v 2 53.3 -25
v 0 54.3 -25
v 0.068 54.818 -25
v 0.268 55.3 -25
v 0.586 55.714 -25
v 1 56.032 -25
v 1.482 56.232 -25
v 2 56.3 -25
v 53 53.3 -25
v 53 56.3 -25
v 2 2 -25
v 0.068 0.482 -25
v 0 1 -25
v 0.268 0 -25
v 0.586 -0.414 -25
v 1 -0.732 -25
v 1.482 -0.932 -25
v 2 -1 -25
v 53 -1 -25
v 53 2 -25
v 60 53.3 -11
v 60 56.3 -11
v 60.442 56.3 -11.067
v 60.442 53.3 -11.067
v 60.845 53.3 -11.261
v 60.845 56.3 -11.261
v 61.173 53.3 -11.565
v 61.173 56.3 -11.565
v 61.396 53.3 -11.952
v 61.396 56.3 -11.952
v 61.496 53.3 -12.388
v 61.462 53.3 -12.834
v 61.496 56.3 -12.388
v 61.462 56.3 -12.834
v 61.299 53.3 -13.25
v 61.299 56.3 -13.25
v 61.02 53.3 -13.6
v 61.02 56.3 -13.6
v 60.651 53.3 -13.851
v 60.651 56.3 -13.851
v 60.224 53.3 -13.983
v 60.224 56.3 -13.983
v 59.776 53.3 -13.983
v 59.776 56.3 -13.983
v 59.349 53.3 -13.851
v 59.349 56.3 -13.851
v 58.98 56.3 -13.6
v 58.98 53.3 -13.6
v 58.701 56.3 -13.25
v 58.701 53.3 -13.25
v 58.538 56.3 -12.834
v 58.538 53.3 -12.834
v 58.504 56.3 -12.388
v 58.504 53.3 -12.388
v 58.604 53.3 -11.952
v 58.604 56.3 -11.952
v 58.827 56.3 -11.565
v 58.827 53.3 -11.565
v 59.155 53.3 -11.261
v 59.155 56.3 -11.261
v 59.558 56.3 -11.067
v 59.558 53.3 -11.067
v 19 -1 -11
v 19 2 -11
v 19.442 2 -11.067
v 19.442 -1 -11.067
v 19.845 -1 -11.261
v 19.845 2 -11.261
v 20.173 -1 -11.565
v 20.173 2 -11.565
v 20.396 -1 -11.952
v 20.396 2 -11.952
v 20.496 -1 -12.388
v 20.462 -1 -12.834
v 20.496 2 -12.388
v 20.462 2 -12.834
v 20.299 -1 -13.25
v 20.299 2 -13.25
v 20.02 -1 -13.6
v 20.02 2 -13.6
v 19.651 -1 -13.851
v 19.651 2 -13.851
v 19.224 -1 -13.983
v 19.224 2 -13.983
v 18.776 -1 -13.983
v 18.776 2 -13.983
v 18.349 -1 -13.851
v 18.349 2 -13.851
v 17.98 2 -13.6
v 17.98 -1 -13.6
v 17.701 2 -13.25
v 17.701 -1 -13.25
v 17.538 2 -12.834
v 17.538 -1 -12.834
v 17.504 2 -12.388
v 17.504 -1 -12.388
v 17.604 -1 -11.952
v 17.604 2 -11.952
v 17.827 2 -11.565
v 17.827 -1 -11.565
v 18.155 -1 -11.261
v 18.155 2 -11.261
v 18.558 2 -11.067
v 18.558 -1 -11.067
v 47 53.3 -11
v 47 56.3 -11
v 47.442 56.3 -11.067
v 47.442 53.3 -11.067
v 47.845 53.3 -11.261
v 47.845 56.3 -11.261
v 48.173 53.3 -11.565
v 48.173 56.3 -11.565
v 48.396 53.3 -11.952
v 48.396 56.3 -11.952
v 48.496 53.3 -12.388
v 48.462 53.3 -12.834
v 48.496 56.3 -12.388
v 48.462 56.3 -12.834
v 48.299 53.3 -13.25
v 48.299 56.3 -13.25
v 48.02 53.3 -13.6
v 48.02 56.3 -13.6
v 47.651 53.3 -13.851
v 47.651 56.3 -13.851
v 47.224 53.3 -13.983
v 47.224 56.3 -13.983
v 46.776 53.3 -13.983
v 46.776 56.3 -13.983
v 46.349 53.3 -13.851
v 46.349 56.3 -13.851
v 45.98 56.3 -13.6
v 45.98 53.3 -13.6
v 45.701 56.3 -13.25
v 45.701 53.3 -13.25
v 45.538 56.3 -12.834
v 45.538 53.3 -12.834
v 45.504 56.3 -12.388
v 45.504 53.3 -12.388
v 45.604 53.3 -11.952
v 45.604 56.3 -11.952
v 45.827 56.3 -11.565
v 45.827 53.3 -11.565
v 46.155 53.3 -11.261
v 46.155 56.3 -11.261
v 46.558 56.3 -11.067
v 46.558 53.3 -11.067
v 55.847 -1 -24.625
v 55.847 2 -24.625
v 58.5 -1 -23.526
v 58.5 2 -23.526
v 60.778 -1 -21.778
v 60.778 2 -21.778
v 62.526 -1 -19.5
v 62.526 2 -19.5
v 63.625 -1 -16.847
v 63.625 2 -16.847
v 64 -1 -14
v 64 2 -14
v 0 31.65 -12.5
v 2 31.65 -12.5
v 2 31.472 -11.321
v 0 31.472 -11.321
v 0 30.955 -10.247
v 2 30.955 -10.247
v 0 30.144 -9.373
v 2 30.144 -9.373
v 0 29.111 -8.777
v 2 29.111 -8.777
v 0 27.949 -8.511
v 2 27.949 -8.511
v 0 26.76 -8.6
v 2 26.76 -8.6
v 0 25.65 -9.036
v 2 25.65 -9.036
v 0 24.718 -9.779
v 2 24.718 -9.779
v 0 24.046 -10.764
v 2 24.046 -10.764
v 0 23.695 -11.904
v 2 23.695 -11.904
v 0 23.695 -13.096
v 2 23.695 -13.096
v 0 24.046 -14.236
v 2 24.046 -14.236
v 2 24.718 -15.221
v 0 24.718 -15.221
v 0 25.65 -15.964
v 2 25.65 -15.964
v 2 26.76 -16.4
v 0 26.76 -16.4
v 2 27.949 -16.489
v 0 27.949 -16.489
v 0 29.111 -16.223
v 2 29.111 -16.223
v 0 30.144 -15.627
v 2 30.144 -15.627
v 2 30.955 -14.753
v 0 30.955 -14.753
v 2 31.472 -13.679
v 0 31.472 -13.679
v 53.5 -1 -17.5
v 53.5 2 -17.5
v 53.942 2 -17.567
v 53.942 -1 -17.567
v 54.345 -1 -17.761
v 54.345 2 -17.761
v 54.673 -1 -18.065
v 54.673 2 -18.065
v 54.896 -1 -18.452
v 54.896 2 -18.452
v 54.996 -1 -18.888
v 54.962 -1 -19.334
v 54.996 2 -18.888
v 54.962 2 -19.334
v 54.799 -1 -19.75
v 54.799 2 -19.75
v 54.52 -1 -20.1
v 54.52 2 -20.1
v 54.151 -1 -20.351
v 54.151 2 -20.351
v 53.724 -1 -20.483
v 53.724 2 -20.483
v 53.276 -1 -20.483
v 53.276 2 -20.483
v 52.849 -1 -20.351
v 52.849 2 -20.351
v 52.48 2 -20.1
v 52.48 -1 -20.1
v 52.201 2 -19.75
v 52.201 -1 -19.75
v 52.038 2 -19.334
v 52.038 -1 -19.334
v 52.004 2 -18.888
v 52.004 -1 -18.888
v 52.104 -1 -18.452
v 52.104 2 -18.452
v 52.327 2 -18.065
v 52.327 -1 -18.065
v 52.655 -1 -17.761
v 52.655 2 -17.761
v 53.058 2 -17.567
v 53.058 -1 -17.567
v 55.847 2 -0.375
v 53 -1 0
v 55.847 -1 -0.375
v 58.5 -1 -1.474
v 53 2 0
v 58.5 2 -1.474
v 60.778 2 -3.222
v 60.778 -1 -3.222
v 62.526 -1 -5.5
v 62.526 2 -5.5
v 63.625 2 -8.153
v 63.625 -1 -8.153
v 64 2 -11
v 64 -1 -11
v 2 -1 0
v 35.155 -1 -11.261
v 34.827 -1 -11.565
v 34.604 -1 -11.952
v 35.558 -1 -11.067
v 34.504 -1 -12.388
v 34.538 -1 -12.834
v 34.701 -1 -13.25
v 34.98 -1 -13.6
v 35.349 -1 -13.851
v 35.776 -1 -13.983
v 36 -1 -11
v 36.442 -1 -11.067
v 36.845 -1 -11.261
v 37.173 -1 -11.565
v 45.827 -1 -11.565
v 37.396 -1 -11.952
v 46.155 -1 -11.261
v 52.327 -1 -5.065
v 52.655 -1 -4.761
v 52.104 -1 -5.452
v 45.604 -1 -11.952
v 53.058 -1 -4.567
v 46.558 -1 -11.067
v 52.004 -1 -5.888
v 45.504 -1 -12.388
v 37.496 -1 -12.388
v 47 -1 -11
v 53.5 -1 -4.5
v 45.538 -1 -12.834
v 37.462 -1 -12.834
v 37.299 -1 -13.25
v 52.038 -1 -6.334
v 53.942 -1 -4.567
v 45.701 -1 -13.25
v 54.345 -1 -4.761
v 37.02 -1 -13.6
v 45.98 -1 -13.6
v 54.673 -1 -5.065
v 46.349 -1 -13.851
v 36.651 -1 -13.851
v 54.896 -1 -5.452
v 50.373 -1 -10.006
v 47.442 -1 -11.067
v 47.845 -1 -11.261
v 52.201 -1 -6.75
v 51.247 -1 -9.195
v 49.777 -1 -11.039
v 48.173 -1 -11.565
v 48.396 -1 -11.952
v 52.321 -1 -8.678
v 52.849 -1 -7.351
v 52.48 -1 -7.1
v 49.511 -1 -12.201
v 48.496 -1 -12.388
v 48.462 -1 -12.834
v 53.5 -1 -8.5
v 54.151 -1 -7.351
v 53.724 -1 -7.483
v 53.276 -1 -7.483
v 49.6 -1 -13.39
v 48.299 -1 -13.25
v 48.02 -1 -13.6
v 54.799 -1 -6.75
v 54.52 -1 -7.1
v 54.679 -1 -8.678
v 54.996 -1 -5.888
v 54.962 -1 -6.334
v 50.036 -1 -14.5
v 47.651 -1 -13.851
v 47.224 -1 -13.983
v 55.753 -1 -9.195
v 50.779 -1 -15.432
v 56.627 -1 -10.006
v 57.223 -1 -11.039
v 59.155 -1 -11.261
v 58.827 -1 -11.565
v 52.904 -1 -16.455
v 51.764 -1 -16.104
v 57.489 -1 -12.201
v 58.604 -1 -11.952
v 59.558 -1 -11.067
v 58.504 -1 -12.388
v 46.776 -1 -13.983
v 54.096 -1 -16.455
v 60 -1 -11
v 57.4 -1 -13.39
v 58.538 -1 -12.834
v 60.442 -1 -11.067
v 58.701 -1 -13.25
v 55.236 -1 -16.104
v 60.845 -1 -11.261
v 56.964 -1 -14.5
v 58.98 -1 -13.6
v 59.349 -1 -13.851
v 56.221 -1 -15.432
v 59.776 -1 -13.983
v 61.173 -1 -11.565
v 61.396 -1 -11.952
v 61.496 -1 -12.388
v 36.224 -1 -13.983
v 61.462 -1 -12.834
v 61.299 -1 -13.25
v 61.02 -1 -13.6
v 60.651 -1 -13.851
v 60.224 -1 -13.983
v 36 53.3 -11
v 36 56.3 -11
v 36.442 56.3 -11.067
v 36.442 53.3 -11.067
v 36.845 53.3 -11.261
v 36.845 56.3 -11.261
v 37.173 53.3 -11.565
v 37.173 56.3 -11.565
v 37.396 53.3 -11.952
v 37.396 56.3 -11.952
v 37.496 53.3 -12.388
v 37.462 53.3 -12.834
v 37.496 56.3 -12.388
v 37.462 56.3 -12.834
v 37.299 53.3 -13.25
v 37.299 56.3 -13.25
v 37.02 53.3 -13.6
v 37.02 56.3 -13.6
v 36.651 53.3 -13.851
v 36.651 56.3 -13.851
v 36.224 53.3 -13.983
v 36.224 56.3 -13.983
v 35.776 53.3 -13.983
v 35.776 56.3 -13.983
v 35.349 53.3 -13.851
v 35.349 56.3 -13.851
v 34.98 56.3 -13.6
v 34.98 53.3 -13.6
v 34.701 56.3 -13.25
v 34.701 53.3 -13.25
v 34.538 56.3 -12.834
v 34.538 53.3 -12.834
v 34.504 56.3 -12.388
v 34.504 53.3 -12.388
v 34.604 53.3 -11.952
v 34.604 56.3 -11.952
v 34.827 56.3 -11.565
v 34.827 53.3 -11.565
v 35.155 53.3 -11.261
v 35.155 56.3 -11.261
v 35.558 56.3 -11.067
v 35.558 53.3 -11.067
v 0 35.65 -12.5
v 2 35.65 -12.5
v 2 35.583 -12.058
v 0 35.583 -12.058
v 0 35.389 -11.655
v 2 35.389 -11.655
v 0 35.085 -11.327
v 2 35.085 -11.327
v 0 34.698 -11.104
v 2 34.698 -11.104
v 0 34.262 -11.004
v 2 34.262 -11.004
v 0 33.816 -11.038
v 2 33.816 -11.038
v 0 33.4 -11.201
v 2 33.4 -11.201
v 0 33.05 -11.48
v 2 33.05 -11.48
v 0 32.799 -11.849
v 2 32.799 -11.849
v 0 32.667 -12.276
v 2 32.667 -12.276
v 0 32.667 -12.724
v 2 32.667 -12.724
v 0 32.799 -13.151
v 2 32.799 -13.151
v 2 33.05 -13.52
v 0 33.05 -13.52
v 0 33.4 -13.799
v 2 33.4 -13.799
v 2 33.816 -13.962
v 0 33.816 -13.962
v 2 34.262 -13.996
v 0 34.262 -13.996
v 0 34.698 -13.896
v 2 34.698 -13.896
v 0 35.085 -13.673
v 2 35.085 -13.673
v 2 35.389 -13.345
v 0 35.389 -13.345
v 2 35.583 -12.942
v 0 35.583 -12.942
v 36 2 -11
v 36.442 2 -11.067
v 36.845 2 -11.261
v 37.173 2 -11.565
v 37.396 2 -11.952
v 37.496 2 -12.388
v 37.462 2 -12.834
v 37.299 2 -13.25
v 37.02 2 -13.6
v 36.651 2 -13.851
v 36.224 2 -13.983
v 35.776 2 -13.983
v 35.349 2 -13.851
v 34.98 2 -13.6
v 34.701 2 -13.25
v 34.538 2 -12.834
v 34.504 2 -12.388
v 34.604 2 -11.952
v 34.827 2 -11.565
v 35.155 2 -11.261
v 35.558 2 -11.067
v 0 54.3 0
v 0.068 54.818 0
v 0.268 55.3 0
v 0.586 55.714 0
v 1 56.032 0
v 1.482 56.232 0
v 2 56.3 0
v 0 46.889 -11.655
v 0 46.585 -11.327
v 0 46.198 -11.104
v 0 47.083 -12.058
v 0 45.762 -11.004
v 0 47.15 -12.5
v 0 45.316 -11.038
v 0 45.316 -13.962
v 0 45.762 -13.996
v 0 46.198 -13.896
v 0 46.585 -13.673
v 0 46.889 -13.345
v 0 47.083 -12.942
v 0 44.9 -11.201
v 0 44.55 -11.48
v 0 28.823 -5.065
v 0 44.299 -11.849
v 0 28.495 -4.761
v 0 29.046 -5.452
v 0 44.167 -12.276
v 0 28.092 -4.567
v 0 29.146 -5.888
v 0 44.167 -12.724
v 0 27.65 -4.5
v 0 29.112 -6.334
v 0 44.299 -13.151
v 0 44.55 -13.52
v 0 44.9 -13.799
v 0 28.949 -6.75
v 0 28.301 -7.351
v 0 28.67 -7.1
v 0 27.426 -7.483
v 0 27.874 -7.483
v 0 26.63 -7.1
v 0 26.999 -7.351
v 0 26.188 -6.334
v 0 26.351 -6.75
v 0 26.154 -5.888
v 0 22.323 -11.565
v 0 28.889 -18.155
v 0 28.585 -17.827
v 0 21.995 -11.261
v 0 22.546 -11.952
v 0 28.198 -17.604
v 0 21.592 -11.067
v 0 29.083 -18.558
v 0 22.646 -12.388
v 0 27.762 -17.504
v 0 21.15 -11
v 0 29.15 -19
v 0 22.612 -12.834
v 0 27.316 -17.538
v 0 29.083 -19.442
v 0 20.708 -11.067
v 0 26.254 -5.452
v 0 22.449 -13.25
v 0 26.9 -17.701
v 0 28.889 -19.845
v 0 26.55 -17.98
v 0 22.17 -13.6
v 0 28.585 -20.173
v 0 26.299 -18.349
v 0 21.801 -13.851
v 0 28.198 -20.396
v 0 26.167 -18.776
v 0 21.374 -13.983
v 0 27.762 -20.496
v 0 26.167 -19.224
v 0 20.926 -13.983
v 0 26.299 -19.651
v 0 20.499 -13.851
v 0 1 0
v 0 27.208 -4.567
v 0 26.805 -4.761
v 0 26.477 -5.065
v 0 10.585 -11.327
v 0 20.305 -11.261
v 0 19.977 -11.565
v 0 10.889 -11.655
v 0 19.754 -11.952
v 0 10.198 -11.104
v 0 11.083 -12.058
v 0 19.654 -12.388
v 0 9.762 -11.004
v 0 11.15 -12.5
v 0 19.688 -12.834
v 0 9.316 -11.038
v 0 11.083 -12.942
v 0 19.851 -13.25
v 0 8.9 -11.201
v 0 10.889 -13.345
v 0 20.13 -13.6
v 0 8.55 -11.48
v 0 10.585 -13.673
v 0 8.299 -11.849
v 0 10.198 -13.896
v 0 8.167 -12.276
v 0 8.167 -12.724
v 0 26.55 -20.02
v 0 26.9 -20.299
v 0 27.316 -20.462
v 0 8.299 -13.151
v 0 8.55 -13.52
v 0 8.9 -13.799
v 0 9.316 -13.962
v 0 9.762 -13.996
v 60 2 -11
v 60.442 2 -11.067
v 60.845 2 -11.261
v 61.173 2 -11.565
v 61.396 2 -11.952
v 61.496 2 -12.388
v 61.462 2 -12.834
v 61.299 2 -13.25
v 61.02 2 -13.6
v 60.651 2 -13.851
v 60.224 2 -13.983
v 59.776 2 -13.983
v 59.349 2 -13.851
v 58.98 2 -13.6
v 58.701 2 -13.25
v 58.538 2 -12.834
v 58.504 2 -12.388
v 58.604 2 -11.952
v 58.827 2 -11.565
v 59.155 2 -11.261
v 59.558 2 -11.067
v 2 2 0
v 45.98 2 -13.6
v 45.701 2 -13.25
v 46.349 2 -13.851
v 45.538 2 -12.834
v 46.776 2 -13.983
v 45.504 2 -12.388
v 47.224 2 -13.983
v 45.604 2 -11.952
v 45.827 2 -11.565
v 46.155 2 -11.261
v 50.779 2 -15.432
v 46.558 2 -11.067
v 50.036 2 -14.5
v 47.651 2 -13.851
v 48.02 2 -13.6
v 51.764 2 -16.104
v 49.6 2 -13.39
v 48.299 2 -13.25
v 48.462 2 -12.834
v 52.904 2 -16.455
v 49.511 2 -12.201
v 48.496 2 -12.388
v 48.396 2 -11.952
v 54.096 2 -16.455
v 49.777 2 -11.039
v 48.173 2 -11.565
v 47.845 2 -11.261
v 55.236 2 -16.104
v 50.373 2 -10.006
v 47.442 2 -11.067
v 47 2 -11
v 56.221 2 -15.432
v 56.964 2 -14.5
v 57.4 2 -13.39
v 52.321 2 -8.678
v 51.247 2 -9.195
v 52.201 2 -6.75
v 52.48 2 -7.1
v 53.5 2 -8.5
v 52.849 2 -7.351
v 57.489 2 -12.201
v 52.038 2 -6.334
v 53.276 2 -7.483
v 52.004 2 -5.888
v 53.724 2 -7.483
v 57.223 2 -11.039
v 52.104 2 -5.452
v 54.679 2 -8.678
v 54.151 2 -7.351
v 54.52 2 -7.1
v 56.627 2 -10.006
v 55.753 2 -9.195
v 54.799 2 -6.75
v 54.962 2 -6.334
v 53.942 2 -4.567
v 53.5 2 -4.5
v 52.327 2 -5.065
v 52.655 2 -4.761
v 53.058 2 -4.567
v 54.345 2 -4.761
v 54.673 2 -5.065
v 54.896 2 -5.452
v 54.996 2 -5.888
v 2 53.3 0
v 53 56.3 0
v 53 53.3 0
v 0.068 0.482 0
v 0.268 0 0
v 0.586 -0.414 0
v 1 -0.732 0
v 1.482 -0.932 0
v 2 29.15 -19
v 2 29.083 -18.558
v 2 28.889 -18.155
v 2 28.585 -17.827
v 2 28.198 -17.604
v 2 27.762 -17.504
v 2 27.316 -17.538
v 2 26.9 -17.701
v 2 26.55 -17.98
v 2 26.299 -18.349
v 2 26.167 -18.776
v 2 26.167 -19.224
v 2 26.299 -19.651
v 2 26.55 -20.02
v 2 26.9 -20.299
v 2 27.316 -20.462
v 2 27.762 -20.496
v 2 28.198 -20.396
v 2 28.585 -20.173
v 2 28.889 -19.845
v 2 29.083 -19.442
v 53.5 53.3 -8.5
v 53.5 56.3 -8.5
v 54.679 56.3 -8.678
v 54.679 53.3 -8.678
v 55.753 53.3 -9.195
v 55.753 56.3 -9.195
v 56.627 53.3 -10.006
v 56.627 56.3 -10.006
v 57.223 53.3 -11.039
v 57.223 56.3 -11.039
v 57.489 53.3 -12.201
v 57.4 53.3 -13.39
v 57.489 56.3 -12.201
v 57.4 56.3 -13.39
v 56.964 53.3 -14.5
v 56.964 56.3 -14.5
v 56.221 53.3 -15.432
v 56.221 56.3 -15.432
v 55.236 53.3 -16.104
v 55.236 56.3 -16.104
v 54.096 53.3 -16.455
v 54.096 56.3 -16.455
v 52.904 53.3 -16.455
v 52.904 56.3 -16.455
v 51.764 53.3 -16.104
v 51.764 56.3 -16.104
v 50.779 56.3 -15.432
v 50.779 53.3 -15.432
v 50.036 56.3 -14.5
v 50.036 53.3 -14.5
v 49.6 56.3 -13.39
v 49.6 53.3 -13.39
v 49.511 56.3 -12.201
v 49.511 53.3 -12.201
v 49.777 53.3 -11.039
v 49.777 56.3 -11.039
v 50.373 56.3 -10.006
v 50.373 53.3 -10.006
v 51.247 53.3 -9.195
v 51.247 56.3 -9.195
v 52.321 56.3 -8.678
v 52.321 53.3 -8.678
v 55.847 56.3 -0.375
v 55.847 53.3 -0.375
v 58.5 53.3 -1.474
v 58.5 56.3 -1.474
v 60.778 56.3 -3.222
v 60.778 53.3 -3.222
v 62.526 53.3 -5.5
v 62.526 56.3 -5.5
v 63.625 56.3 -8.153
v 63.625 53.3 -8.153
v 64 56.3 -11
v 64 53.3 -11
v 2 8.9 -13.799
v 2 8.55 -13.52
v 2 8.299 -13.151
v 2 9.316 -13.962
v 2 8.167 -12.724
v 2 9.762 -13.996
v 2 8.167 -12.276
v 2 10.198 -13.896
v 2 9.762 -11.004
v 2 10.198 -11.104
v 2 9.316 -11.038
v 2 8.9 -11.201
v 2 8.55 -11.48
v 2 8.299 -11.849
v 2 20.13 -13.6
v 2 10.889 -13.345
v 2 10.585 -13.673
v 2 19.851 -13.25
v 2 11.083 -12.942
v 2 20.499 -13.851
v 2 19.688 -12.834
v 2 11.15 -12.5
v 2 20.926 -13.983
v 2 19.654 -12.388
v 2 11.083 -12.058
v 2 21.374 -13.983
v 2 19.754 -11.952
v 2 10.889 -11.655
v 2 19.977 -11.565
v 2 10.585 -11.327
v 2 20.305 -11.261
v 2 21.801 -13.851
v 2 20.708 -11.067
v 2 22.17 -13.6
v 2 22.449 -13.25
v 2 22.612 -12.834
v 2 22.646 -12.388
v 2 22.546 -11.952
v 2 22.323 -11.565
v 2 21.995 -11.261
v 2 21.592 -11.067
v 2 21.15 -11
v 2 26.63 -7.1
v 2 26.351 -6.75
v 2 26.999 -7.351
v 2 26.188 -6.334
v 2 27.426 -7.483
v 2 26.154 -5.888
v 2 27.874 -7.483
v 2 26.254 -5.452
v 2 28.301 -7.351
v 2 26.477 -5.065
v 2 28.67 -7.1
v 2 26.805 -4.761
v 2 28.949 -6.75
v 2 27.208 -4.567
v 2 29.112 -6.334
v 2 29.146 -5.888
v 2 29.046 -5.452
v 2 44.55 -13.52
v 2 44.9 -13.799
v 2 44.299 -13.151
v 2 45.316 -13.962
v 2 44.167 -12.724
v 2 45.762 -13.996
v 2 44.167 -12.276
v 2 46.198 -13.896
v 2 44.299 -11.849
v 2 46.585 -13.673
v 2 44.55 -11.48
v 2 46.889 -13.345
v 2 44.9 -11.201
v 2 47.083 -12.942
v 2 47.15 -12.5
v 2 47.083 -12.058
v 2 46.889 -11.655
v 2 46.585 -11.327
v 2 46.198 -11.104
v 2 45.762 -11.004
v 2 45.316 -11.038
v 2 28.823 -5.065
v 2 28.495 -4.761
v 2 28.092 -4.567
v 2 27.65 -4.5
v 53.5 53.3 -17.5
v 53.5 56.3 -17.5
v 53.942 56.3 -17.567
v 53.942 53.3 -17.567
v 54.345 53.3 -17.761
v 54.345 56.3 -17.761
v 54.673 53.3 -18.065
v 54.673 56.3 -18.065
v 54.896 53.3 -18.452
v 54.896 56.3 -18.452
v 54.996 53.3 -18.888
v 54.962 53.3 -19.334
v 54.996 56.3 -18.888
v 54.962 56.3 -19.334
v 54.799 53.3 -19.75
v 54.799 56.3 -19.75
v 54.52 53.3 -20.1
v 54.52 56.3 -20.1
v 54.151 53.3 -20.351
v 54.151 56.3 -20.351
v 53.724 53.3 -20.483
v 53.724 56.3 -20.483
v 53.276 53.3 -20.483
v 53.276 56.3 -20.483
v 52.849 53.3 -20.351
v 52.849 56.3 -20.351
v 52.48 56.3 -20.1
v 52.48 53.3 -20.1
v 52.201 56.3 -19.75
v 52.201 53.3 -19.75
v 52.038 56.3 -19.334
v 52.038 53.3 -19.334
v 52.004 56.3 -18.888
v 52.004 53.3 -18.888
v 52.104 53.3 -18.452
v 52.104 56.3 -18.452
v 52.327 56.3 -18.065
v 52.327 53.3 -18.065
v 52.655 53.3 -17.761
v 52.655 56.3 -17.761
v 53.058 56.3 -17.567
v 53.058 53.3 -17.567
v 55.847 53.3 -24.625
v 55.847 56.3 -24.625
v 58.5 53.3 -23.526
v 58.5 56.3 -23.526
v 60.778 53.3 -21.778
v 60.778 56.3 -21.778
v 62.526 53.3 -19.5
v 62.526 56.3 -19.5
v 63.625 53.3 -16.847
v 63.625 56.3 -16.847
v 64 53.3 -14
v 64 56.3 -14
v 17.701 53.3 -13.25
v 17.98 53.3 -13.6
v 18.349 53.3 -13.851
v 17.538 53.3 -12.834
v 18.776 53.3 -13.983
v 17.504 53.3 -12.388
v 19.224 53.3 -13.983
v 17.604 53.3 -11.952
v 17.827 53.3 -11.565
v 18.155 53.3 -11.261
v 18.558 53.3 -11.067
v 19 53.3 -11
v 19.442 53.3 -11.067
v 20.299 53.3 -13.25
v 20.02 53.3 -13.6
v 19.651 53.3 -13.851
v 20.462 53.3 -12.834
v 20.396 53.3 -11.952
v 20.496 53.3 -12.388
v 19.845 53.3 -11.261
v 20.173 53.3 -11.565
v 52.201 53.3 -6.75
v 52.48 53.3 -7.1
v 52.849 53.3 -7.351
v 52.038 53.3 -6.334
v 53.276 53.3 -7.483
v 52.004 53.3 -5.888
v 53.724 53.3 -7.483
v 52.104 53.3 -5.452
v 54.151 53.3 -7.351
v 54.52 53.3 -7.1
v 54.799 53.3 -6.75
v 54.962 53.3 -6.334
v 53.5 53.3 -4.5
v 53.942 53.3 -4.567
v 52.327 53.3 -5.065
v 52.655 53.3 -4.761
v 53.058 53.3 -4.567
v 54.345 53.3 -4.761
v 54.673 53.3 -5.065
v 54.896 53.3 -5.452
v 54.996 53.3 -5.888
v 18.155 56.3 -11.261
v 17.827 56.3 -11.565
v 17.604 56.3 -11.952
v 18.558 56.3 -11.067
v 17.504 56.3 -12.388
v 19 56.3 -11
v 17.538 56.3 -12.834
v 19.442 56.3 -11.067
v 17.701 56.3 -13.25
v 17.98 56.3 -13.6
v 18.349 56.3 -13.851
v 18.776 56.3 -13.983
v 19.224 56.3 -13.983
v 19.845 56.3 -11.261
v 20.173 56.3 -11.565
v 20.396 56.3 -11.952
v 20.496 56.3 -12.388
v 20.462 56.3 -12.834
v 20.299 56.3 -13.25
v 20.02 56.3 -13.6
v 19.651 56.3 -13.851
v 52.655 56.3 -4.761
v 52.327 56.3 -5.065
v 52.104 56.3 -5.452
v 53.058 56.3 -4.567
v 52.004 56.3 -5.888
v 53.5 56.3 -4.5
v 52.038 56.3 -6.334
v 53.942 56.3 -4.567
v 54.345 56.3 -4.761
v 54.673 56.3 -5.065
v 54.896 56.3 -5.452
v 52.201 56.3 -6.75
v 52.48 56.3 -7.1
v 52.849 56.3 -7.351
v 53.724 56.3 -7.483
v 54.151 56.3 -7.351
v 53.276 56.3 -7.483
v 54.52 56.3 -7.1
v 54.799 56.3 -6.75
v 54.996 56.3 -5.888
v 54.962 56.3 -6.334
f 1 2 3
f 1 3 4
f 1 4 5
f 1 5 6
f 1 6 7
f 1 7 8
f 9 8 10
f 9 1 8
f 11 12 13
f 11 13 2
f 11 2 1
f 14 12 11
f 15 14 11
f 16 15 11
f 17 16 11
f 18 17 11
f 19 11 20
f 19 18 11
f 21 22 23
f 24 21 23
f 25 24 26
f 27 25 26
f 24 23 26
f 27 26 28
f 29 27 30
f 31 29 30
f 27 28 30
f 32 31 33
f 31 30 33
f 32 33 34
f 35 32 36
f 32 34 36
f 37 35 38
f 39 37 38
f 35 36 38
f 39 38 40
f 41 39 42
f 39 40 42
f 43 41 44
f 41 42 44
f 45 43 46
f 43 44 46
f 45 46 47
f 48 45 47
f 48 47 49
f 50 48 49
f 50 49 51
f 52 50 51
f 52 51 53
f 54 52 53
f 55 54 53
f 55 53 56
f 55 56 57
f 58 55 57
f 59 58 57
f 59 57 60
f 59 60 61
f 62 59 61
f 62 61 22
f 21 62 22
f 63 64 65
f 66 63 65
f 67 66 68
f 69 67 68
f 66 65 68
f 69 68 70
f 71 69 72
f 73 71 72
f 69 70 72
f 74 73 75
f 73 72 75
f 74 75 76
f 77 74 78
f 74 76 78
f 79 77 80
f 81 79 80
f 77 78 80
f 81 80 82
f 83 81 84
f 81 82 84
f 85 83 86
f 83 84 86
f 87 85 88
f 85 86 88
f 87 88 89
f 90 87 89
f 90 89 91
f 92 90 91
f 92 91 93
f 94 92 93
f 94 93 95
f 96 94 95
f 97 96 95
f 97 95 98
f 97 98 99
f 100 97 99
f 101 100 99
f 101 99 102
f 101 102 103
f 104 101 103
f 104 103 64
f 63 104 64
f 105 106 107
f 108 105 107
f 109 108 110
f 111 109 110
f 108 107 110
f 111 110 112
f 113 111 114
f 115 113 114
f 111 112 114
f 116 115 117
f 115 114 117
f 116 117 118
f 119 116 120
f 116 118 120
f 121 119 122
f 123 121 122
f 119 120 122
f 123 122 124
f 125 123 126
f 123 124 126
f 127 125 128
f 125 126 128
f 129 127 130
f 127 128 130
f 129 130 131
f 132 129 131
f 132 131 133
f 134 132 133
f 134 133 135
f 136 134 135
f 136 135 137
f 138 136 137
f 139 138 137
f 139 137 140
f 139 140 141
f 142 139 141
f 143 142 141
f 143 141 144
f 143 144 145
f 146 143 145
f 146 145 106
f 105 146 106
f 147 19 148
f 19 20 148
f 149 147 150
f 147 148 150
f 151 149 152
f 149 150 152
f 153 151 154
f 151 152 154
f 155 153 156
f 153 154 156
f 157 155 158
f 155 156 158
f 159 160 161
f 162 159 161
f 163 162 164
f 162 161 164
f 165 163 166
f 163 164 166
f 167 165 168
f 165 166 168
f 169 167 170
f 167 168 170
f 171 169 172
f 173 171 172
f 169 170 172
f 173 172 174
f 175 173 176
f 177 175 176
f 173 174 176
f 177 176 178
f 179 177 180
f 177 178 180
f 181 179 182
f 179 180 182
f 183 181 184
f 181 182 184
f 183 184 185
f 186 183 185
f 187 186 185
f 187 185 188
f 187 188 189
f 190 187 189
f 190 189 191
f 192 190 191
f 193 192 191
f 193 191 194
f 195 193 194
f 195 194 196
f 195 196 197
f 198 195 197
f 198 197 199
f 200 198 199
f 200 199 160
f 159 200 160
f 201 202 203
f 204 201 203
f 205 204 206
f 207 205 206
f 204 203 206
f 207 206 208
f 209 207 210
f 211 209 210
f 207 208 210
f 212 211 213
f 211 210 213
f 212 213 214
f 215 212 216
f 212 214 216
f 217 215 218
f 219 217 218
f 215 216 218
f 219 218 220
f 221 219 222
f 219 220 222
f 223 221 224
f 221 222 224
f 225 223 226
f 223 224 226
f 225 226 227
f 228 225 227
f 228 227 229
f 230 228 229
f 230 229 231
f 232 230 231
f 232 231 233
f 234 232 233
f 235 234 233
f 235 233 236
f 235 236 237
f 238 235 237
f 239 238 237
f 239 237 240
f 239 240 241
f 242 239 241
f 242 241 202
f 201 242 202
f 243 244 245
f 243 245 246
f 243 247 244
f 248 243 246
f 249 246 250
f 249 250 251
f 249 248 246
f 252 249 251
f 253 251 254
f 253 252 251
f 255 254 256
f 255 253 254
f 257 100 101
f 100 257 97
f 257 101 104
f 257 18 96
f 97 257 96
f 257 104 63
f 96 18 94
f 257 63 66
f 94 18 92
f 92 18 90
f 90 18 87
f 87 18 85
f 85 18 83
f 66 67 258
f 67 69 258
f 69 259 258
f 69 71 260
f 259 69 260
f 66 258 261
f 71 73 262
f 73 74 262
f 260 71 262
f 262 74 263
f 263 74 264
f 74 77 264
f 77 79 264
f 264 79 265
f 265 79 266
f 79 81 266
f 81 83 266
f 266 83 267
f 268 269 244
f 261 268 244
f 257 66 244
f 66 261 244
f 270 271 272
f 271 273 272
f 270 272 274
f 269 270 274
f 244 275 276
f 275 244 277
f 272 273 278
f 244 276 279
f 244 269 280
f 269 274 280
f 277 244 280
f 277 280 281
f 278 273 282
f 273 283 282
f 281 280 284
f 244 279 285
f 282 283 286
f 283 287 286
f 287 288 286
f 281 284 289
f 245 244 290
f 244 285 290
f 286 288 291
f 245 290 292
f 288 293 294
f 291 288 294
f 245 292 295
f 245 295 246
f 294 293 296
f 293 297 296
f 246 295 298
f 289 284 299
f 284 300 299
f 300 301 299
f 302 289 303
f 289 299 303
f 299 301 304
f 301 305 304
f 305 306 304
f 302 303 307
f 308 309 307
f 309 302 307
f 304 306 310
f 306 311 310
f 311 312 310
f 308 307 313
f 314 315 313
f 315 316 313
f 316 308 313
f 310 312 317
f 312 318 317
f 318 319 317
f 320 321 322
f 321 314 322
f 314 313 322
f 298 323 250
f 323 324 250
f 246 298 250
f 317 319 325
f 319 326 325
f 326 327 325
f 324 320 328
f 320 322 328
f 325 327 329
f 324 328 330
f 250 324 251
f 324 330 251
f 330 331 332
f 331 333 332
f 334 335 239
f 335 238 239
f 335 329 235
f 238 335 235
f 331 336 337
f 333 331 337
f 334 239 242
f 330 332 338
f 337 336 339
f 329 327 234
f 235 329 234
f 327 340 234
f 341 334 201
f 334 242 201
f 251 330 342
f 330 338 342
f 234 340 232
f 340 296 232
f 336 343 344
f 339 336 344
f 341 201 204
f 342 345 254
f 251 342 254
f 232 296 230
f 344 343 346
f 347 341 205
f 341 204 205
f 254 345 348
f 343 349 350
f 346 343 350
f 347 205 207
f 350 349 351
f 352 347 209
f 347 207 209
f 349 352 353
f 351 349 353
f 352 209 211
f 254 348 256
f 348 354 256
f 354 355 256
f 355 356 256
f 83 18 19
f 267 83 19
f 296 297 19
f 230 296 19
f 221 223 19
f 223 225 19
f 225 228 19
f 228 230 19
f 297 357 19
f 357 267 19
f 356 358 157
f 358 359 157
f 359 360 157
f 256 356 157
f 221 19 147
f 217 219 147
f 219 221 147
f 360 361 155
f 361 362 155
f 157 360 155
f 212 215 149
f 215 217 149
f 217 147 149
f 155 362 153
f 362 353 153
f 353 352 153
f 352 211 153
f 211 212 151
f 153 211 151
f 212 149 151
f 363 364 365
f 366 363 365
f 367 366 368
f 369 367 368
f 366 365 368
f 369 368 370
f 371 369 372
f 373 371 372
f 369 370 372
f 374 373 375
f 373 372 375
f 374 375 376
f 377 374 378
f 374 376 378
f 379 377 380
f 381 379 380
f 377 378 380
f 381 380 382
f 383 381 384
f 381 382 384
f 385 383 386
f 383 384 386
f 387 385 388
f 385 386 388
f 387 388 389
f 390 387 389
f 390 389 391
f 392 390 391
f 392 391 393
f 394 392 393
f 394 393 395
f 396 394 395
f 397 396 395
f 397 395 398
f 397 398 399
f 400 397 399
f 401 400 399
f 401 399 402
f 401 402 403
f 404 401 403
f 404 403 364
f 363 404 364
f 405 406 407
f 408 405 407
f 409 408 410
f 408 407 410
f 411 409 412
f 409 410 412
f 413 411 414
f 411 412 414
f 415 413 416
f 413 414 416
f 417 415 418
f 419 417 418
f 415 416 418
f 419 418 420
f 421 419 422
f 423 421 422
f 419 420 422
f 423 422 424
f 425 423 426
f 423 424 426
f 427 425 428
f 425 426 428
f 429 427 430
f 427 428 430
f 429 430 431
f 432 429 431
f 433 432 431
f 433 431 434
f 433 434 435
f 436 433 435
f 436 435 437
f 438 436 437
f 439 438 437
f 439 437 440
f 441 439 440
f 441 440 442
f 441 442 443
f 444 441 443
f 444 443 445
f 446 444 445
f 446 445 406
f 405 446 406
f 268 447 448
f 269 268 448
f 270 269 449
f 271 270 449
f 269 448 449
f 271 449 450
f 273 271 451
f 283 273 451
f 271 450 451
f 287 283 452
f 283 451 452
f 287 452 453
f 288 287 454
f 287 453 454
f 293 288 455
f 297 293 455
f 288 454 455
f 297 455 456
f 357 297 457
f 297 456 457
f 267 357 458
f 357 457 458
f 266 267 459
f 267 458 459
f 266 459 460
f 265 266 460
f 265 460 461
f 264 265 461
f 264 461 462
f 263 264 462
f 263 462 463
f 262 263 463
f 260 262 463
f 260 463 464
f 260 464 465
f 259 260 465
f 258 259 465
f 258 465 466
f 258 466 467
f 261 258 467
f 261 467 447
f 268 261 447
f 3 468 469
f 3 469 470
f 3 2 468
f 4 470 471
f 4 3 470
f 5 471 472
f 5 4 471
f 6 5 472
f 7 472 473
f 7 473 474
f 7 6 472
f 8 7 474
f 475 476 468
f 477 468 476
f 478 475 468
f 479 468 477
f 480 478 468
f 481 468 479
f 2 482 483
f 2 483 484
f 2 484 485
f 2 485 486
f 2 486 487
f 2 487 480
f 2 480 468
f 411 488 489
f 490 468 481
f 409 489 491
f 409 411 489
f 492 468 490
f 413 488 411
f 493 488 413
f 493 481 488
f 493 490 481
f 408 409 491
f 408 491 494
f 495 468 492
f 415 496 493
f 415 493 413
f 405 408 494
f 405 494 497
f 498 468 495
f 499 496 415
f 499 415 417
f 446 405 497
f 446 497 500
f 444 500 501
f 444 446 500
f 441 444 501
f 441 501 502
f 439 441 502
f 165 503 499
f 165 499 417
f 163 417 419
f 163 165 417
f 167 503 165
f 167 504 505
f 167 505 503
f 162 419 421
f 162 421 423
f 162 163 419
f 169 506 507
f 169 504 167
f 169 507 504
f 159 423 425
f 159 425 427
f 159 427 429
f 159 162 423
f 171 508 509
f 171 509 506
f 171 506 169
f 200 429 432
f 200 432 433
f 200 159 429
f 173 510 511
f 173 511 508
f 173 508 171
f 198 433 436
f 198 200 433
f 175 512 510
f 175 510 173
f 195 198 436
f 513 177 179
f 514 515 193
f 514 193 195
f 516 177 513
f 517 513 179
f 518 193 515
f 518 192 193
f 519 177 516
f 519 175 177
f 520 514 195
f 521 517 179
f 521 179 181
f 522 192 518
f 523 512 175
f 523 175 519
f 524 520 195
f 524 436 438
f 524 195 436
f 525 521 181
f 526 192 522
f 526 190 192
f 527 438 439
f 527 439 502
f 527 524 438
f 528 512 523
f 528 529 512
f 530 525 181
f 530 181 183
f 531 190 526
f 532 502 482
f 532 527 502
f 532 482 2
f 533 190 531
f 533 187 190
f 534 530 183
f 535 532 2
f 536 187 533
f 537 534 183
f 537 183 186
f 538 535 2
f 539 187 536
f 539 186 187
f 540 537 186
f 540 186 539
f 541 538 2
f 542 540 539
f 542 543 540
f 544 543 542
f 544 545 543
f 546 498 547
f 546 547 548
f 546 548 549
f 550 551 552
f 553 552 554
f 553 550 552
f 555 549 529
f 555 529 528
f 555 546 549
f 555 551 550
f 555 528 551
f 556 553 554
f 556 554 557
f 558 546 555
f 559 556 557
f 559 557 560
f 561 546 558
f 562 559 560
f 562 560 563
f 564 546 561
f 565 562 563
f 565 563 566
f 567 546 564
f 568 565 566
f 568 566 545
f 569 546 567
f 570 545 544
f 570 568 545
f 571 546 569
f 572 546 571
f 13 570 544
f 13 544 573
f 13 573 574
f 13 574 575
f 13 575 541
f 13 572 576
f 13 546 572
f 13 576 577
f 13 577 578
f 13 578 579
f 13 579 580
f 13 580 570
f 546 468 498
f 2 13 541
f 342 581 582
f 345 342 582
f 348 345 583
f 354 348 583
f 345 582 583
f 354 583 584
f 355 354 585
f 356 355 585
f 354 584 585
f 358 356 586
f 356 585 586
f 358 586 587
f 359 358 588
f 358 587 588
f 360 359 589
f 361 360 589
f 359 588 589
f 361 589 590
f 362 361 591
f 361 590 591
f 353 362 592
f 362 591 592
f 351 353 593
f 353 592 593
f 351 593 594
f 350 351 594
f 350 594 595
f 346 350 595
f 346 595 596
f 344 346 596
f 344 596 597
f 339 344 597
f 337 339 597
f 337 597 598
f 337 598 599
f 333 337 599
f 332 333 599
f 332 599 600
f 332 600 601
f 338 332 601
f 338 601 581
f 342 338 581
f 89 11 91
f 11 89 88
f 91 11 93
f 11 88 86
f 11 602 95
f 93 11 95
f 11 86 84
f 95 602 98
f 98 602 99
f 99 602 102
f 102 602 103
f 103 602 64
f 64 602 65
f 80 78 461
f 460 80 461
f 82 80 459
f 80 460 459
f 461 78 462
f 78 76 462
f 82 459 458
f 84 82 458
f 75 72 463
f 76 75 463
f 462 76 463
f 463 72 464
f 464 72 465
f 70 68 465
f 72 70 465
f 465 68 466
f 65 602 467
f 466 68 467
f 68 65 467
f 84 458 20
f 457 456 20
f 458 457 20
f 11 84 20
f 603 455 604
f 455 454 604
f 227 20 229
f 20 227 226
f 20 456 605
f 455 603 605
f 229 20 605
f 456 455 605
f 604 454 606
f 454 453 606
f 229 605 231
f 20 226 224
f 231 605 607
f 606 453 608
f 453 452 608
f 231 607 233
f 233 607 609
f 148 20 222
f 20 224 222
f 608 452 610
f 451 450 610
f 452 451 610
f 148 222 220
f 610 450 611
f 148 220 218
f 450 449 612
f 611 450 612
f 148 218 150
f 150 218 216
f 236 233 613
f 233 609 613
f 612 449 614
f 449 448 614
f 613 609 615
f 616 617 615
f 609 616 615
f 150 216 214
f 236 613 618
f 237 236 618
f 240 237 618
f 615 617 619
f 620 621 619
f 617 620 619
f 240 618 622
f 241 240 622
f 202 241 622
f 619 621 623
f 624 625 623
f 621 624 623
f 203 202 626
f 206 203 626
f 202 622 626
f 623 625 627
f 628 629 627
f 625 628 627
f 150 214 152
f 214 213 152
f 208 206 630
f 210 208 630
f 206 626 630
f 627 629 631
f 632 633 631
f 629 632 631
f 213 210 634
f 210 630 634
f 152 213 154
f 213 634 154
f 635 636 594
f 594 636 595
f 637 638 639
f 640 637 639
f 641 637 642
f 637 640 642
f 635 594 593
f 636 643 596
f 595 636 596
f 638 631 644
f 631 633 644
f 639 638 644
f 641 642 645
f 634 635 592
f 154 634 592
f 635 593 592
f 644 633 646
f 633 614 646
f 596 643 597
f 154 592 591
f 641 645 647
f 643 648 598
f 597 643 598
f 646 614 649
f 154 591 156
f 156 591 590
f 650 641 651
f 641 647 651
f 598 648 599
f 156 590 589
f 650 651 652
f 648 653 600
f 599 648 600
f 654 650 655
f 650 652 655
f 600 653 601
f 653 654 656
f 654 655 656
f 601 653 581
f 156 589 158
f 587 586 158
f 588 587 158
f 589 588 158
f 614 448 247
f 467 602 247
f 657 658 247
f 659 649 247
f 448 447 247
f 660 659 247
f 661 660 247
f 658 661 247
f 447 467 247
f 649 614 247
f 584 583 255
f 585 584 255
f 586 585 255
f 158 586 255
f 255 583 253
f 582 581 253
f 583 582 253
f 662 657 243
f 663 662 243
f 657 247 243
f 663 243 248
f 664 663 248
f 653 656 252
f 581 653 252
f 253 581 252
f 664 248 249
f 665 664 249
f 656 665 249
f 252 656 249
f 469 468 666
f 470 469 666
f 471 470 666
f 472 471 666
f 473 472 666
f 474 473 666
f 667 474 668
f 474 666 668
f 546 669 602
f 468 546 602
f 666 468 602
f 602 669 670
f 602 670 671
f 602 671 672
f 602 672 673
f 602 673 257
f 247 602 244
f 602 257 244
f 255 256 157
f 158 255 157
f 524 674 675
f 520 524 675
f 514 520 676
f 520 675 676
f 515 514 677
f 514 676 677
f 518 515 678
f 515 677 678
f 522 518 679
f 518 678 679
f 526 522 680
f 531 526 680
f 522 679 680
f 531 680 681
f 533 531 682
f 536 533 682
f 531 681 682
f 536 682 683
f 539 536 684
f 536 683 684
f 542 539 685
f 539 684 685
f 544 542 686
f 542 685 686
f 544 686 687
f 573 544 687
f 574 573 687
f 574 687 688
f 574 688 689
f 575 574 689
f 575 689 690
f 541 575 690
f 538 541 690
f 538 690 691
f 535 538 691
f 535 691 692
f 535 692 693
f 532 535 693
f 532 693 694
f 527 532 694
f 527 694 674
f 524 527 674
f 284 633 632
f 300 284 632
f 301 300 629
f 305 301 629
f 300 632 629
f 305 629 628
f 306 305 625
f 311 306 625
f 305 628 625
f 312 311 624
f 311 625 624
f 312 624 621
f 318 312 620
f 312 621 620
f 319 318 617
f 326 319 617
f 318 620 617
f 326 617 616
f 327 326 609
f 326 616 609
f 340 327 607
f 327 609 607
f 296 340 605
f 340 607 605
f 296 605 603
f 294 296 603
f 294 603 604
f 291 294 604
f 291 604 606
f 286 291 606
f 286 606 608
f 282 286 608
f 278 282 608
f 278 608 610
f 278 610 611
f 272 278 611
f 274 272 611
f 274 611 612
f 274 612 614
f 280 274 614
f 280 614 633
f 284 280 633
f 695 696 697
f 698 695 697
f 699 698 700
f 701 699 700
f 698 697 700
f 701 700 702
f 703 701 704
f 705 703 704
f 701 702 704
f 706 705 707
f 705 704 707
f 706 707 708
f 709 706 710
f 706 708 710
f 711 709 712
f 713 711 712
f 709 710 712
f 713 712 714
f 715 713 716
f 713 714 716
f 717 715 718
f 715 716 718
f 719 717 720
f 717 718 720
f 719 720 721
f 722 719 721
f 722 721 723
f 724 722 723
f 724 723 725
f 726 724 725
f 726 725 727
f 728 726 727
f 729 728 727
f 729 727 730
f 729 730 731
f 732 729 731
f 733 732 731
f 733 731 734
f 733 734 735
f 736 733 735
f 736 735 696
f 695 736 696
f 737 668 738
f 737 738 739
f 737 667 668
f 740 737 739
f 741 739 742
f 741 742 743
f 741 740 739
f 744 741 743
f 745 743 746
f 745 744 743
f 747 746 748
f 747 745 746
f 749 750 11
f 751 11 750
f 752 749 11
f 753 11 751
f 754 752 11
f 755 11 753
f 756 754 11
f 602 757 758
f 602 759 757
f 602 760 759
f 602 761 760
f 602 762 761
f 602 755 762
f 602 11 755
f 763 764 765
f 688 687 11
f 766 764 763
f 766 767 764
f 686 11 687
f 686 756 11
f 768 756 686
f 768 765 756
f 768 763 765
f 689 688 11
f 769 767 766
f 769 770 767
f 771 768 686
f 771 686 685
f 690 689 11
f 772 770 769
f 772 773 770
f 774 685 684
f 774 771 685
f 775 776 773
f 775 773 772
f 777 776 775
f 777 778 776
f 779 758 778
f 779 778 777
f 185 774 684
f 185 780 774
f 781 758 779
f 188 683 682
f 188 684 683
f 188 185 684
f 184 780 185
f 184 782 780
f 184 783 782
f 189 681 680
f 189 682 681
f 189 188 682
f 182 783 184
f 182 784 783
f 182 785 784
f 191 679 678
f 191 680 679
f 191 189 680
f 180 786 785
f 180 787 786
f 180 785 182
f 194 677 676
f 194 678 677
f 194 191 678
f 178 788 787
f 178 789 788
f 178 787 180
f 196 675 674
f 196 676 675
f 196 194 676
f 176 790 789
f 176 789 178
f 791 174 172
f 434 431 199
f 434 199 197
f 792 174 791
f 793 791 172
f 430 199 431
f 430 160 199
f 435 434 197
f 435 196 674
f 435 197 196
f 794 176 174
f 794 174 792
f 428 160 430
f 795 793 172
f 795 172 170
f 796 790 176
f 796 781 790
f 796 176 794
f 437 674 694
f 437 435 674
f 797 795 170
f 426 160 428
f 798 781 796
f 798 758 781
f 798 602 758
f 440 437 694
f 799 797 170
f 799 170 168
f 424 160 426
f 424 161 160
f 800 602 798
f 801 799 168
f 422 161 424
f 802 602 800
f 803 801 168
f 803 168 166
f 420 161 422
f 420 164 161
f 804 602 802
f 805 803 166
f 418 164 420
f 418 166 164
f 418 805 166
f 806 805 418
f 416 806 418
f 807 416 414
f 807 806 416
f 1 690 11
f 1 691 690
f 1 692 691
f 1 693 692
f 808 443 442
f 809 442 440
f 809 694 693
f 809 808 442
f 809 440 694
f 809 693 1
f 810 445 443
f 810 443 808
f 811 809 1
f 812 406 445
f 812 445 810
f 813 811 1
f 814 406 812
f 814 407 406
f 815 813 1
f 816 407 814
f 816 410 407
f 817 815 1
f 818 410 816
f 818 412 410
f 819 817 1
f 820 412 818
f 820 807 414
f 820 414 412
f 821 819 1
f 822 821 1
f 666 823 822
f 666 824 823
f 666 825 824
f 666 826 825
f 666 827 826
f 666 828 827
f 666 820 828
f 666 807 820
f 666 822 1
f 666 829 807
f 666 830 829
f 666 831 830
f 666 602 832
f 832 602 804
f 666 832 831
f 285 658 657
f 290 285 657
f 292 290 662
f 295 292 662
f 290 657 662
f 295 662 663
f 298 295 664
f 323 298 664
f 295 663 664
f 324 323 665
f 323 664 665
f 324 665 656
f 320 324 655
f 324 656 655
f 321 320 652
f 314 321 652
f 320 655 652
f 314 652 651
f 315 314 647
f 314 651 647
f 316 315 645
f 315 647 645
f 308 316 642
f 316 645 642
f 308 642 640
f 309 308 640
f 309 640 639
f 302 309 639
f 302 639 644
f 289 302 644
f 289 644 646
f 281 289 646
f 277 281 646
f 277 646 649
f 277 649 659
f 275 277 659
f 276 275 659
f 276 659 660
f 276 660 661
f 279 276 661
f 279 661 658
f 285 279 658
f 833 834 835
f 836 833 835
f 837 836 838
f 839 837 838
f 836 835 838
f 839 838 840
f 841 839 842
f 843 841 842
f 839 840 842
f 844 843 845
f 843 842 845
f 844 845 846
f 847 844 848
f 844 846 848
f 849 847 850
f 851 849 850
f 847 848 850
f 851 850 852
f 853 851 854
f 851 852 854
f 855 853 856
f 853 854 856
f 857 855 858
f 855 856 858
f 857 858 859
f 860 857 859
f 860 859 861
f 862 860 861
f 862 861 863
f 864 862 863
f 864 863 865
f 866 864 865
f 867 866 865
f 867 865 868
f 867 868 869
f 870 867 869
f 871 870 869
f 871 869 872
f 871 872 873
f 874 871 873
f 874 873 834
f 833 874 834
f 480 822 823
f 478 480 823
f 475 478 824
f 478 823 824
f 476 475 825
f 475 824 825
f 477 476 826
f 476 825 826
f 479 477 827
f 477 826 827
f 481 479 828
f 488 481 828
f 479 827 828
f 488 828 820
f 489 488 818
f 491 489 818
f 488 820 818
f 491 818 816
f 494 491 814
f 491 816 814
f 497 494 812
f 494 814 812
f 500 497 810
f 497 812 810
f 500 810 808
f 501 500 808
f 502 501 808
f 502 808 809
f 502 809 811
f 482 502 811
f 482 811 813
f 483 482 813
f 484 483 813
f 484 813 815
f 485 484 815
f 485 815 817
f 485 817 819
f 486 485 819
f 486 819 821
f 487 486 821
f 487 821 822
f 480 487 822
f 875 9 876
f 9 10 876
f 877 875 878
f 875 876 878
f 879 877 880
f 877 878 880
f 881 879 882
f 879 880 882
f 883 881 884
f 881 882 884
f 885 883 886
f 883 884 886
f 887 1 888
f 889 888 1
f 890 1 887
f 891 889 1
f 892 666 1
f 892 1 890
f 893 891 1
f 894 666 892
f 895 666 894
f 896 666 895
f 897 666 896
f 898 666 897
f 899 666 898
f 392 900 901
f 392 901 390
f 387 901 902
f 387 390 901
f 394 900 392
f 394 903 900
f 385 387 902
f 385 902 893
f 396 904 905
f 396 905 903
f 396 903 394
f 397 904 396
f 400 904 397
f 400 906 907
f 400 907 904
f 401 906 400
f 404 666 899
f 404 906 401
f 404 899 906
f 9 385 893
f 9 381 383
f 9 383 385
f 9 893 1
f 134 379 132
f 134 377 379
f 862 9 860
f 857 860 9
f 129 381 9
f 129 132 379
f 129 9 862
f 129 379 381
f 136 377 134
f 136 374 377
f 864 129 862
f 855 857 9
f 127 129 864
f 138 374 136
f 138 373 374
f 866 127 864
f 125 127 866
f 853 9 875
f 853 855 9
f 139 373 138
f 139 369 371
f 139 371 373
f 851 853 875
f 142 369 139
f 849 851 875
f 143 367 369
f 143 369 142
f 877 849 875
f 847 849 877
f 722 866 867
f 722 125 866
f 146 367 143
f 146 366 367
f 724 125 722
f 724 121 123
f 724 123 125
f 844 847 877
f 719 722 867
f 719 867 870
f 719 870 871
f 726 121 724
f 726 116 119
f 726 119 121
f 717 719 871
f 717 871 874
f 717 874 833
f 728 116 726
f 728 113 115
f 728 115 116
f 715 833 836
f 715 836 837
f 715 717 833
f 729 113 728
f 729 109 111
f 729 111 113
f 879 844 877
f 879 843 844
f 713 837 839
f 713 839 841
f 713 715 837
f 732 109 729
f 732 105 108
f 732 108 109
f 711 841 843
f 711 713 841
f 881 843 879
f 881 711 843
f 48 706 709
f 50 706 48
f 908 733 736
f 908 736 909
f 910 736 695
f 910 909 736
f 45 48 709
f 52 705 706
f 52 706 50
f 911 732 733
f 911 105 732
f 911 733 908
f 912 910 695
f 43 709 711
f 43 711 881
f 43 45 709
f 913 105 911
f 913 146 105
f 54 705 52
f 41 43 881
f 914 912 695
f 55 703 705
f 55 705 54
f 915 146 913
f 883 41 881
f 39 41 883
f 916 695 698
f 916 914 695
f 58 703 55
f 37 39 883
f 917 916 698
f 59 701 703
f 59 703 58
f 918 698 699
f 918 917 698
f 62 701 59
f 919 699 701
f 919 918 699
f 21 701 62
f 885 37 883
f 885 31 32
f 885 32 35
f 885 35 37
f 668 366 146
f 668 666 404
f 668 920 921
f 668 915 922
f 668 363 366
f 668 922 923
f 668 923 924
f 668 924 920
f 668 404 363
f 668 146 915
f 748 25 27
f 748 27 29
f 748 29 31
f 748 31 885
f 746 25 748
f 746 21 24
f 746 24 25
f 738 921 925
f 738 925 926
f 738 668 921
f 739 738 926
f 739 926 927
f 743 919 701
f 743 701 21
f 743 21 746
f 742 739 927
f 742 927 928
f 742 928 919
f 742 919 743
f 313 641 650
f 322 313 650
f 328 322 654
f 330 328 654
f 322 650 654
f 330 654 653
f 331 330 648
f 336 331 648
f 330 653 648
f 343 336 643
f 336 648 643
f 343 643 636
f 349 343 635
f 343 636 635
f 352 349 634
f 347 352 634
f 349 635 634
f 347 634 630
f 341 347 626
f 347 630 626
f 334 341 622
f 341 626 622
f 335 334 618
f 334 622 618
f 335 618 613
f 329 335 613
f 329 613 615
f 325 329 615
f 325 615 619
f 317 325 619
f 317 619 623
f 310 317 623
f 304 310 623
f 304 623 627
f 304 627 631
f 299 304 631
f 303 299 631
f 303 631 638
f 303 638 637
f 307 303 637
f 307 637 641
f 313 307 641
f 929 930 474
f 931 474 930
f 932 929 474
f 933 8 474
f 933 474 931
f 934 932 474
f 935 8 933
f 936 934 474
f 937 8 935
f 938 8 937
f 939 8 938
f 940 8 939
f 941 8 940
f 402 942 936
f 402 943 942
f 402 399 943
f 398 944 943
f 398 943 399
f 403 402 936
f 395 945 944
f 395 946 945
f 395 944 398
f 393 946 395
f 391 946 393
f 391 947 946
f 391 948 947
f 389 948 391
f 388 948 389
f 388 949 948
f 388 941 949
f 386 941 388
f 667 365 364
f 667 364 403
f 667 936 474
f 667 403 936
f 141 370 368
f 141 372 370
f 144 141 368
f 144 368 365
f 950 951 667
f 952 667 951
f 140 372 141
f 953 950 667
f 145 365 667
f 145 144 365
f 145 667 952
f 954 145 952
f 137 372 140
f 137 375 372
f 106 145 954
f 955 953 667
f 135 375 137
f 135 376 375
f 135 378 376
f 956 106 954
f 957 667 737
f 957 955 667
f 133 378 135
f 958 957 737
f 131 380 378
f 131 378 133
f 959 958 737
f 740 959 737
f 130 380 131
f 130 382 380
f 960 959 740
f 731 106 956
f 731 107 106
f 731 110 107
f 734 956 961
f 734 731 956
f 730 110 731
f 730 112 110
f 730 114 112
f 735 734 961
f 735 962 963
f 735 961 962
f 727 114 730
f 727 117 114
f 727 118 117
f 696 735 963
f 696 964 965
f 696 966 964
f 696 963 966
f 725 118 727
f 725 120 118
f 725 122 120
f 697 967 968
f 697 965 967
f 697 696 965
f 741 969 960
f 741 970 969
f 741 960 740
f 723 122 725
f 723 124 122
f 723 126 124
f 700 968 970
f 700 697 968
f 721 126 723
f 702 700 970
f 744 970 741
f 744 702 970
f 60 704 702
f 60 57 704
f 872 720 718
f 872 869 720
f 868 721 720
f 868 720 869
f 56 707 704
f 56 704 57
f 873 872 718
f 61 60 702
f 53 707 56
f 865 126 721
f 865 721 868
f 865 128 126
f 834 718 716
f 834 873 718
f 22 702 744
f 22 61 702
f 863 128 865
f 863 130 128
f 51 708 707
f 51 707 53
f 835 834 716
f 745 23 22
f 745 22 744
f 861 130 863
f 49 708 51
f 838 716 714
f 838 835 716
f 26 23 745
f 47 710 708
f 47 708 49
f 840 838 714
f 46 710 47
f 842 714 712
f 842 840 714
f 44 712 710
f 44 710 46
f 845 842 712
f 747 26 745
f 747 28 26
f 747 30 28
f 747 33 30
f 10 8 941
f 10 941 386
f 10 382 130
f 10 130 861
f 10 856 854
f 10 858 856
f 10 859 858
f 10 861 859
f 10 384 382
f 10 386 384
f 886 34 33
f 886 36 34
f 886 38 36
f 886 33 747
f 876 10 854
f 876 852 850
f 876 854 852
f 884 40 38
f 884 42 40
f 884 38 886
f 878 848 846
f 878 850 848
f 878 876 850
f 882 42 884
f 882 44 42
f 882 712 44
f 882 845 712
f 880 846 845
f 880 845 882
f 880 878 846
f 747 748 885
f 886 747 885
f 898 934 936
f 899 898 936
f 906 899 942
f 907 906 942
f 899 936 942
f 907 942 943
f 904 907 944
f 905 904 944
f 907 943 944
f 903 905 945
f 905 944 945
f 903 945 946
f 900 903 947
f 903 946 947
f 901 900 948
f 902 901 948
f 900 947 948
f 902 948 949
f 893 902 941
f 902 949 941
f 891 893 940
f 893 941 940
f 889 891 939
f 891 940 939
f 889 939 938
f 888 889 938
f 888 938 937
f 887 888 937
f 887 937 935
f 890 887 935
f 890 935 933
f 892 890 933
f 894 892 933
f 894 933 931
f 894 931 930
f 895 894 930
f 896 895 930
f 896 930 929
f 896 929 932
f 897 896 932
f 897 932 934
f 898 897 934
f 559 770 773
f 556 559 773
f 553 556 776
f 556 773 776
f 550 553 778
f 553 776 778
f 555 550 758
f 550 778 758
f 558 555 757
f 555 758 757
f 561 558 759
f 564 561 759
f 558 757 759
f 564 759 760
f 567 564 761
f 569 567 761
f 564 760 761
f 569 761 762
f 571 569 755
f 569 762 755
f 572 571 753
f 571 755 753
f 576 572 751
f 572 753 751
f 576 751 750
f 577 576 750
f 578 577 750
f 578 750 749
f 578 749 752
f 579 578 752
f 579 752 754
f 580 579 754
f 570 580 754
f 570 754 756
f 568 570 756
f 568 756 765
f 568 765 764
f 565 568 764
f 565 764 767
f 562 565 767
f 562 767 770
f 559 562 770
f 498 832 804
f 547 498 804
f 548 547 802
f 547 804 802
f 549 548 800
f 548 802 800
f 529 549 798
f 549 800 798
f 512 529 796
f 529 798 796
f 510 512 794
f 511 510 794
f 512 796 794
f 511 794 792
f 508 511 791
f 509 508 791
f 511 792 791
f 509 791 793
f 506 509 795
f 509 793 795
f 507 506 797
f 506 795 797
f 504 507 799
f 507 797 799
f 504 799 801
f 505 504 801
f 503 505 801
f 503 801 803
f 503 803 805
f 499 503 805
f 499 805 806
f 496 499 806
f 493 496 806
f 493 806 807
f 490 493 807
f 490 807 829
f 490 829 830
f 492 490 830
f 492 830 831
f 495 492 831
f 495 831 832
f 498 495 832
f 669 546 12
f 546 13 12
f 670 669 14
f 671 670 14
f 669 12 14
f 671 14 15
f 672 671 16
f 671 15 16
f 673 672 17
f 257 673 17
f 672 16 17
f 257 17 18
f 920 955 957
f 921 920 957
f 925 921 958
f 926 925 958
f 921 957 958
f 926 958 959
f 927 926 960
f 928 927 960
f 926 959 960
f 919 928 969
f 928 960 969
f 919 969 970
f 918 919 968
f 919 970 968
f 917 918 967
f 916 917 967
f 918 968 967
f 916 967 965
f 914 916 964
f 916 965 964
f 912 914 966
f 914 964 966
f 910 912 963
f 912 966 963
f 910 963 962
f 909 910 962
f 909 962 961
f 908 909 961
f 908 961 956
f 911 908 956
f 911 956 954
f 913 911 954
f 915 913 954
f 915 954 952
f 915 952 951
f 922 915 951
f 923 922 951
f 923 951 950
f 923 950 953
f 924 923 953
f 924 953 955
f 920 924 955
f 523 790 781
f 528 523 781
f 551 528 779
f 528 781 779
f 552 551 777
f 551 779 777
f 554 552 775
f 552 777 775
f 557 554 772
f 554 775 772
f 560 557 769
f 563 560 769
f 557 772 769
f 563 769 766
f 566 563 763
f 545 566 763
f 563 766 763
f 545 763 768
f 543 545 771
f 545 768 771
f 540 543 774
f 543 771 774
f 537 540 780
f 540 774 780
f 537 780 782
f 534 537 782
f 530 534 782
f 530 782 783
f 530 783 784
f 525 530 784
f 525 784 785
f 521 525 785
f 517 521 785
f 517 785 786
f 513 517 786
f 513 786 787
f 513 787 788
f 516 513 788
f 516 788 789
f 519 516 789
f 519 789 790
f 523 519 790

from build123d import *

# Parameters (mm, degrees)
BOSS_EXTRUDE1_DEPTH      = 56.3
BOSS_EXTRUDE1_DEPTH_BACK = 1
SKETCH1_W                = 64
SKETCH1_H                = 25
SKETCH3_W                = 62
SKETCH3_H                = 51.3
CUT_EXTRUDE2_DEPTH       = 89.829555892
SKETCH4_R                = 4
SKETCH4_R_2              = 1.5
CUT_EXTRUDE3_DEPTH       = 56
SKETCH8_R                = 1.5
CUT_EXTRUDE4_DEPTH       = 56
FILLET1_R                = 2
SKETCH9_R                = 1.5
SKETCH9_R_2              = 4
CUT_EXTRUDE5_DEPTH       = 90.466697715
FILLET3_R                = 11
SKETCH10_R               = 1.5
CUT_EXTRUDE6_DEPTH       = 90.466697715


with BuildPart() as part:
    # Sketch1 → Boss-Extrude1 (new, two sides: drawn at the far end of the back side and taken through both)
    with BuildSketch(Plane(origin=(0, 0, 0), x_dir=(1, 0, 0), z_dir=(0, 1, 0)).offset(-BOSS_EXTRUDE1_DEPTH_BACK)):
        with Locations((32, 12.5)):
            Rectangle(SKETCH1_W, SKETCH1_H)
    extrude(amount=BOSS_EXTRUDE1_DEPTH + BOSS_EXTRUDE1_DEPTH_BACK)

    # Sketch3 → Cut-Extrude2 (cut, through all)
    with BuildSketch(Plane.XY):
        with Locations((33, 27.65)):
            Rectangle(SKETCH3_W, SKETCH3_H)
    extrude(amount=-CUT_EXTRUDE2_DEPTH, mode=Mode.SUBTRACT)

    # Sketch4 → Cut-Extrude3 (cut)
    with BuildSketch(Plane(origin=(2, 0, 0), x_dir=(0, 0, -1), z_dir=(1, 0, 0))):
        with Locations(Location((12.5, 27.65, 0), (0, 0, 90))):
            Circle(SKETCH4_R)
        with Locations(Location((19, 27.65, 0), (0, 0, 90))):
            Circle(SKETCH4_R_2)
        with Locations(Location((12.5, 34.15, 0), (0, 0, 90))):
            Circle(SKETCH4_R_2)
        with Locations(Location((6, 27.65, 0), (0, 0, 180))):
            Circle(SKETCH4_R_2)
        with Locations(Location((12.5, 21.15, 0), (0, 0, 180))):
            Circle(SKETCH4_R_2)
    extrude(amount=-CUT_EXTRUDE3_DEPTH, mode=Mode.SUBTRACT)

    # Sketch8 → Cut-Extrude4 (cut)
    with BuildSketch(Plane(origin=(2, 0, 0), x_dir=(0, 0, -1), z_dir=(1, 0, 0))):
        with Locations(Location((12.5, 45.65, 0), (0, 0, 90))):
            Circle(SKETCH8_R)
        with Locations(Location((12.5, 9.65, 0), (0, 0, 90))):
            Circle(SKETCH8_R)
    extrude(amount=-CUT_EXTRUDE4_DEPTH, mode=Mode.SUBTRACT)

    # Fillet1
    fillet1_edges = [part.edges().sort_by_distance(p)[0] for p in [
        (0, 56.3, -12.5),
        (0, -1, -12.5),
    ]]
    fillet(fillet1_edges, radius=FILLET1_R)

    # Sketch9 → Cut-Extrude5 (cut, through all)
    with BuildSketch(Plane(origin=(0, 56.3, 0), x_dir=(1, 0, 0), z_dir=(0, 1, 0))):
        with Locations(Location((60, 12.5, 0), (0, 0, 270))):
            Circle(SKETCH9_R)
        with Locations(Location((53.5, 12.5, 0), (0, 0, 270))):
            Circle(SKETCH9_R_2)
        with Locations(Location((53.5, 19, 0), (0, 0, 270))):
            Circle(SKETCH9_R)
        with Locations(Location((47, 12.5, 0), (0, 0, 270))):
            Circle(SKETCH9_R)
        with Locations(Location((53.5, 6, 0), (0, 0, 270))):
            Circle(SKETCH9_R)
    extrude(amount=-CUT_EXTRUDE5_DEPTH, mode=Mode.SUBTRACT)

    # Fillet3
    fillet3_edges = [part.edges().sort_by_distance(p)[0] for p in [
        (64, 54.8, 0),
        (64, 54.8, -25),
        (64, 0.5, -25),
        (64, 0.5, 0),
    ]]
    fillet(fillet3_edges, radius=FILLET3_R)

    # Sketch10 → Cut-Extrude6 (cut, through all)
    with BuildSketch(Plane(origin=(0, 56.3, 0), x_dir=(1, 0, 0), z_dir=(0, 1, 0))):
        with Locations(Location((36, 12.5, 0), (0, 0, 270))):
            Circle(SKETCH10_R)
        with Locations(Location((19, 12.5, 0), (0, 0, 270))):
            Circle(SKETCH10_R)
    extrude(amount=-CUT_EXTRUDE6_DEPTH, mode=Mode.SUBTRACT)


solid = part.part
